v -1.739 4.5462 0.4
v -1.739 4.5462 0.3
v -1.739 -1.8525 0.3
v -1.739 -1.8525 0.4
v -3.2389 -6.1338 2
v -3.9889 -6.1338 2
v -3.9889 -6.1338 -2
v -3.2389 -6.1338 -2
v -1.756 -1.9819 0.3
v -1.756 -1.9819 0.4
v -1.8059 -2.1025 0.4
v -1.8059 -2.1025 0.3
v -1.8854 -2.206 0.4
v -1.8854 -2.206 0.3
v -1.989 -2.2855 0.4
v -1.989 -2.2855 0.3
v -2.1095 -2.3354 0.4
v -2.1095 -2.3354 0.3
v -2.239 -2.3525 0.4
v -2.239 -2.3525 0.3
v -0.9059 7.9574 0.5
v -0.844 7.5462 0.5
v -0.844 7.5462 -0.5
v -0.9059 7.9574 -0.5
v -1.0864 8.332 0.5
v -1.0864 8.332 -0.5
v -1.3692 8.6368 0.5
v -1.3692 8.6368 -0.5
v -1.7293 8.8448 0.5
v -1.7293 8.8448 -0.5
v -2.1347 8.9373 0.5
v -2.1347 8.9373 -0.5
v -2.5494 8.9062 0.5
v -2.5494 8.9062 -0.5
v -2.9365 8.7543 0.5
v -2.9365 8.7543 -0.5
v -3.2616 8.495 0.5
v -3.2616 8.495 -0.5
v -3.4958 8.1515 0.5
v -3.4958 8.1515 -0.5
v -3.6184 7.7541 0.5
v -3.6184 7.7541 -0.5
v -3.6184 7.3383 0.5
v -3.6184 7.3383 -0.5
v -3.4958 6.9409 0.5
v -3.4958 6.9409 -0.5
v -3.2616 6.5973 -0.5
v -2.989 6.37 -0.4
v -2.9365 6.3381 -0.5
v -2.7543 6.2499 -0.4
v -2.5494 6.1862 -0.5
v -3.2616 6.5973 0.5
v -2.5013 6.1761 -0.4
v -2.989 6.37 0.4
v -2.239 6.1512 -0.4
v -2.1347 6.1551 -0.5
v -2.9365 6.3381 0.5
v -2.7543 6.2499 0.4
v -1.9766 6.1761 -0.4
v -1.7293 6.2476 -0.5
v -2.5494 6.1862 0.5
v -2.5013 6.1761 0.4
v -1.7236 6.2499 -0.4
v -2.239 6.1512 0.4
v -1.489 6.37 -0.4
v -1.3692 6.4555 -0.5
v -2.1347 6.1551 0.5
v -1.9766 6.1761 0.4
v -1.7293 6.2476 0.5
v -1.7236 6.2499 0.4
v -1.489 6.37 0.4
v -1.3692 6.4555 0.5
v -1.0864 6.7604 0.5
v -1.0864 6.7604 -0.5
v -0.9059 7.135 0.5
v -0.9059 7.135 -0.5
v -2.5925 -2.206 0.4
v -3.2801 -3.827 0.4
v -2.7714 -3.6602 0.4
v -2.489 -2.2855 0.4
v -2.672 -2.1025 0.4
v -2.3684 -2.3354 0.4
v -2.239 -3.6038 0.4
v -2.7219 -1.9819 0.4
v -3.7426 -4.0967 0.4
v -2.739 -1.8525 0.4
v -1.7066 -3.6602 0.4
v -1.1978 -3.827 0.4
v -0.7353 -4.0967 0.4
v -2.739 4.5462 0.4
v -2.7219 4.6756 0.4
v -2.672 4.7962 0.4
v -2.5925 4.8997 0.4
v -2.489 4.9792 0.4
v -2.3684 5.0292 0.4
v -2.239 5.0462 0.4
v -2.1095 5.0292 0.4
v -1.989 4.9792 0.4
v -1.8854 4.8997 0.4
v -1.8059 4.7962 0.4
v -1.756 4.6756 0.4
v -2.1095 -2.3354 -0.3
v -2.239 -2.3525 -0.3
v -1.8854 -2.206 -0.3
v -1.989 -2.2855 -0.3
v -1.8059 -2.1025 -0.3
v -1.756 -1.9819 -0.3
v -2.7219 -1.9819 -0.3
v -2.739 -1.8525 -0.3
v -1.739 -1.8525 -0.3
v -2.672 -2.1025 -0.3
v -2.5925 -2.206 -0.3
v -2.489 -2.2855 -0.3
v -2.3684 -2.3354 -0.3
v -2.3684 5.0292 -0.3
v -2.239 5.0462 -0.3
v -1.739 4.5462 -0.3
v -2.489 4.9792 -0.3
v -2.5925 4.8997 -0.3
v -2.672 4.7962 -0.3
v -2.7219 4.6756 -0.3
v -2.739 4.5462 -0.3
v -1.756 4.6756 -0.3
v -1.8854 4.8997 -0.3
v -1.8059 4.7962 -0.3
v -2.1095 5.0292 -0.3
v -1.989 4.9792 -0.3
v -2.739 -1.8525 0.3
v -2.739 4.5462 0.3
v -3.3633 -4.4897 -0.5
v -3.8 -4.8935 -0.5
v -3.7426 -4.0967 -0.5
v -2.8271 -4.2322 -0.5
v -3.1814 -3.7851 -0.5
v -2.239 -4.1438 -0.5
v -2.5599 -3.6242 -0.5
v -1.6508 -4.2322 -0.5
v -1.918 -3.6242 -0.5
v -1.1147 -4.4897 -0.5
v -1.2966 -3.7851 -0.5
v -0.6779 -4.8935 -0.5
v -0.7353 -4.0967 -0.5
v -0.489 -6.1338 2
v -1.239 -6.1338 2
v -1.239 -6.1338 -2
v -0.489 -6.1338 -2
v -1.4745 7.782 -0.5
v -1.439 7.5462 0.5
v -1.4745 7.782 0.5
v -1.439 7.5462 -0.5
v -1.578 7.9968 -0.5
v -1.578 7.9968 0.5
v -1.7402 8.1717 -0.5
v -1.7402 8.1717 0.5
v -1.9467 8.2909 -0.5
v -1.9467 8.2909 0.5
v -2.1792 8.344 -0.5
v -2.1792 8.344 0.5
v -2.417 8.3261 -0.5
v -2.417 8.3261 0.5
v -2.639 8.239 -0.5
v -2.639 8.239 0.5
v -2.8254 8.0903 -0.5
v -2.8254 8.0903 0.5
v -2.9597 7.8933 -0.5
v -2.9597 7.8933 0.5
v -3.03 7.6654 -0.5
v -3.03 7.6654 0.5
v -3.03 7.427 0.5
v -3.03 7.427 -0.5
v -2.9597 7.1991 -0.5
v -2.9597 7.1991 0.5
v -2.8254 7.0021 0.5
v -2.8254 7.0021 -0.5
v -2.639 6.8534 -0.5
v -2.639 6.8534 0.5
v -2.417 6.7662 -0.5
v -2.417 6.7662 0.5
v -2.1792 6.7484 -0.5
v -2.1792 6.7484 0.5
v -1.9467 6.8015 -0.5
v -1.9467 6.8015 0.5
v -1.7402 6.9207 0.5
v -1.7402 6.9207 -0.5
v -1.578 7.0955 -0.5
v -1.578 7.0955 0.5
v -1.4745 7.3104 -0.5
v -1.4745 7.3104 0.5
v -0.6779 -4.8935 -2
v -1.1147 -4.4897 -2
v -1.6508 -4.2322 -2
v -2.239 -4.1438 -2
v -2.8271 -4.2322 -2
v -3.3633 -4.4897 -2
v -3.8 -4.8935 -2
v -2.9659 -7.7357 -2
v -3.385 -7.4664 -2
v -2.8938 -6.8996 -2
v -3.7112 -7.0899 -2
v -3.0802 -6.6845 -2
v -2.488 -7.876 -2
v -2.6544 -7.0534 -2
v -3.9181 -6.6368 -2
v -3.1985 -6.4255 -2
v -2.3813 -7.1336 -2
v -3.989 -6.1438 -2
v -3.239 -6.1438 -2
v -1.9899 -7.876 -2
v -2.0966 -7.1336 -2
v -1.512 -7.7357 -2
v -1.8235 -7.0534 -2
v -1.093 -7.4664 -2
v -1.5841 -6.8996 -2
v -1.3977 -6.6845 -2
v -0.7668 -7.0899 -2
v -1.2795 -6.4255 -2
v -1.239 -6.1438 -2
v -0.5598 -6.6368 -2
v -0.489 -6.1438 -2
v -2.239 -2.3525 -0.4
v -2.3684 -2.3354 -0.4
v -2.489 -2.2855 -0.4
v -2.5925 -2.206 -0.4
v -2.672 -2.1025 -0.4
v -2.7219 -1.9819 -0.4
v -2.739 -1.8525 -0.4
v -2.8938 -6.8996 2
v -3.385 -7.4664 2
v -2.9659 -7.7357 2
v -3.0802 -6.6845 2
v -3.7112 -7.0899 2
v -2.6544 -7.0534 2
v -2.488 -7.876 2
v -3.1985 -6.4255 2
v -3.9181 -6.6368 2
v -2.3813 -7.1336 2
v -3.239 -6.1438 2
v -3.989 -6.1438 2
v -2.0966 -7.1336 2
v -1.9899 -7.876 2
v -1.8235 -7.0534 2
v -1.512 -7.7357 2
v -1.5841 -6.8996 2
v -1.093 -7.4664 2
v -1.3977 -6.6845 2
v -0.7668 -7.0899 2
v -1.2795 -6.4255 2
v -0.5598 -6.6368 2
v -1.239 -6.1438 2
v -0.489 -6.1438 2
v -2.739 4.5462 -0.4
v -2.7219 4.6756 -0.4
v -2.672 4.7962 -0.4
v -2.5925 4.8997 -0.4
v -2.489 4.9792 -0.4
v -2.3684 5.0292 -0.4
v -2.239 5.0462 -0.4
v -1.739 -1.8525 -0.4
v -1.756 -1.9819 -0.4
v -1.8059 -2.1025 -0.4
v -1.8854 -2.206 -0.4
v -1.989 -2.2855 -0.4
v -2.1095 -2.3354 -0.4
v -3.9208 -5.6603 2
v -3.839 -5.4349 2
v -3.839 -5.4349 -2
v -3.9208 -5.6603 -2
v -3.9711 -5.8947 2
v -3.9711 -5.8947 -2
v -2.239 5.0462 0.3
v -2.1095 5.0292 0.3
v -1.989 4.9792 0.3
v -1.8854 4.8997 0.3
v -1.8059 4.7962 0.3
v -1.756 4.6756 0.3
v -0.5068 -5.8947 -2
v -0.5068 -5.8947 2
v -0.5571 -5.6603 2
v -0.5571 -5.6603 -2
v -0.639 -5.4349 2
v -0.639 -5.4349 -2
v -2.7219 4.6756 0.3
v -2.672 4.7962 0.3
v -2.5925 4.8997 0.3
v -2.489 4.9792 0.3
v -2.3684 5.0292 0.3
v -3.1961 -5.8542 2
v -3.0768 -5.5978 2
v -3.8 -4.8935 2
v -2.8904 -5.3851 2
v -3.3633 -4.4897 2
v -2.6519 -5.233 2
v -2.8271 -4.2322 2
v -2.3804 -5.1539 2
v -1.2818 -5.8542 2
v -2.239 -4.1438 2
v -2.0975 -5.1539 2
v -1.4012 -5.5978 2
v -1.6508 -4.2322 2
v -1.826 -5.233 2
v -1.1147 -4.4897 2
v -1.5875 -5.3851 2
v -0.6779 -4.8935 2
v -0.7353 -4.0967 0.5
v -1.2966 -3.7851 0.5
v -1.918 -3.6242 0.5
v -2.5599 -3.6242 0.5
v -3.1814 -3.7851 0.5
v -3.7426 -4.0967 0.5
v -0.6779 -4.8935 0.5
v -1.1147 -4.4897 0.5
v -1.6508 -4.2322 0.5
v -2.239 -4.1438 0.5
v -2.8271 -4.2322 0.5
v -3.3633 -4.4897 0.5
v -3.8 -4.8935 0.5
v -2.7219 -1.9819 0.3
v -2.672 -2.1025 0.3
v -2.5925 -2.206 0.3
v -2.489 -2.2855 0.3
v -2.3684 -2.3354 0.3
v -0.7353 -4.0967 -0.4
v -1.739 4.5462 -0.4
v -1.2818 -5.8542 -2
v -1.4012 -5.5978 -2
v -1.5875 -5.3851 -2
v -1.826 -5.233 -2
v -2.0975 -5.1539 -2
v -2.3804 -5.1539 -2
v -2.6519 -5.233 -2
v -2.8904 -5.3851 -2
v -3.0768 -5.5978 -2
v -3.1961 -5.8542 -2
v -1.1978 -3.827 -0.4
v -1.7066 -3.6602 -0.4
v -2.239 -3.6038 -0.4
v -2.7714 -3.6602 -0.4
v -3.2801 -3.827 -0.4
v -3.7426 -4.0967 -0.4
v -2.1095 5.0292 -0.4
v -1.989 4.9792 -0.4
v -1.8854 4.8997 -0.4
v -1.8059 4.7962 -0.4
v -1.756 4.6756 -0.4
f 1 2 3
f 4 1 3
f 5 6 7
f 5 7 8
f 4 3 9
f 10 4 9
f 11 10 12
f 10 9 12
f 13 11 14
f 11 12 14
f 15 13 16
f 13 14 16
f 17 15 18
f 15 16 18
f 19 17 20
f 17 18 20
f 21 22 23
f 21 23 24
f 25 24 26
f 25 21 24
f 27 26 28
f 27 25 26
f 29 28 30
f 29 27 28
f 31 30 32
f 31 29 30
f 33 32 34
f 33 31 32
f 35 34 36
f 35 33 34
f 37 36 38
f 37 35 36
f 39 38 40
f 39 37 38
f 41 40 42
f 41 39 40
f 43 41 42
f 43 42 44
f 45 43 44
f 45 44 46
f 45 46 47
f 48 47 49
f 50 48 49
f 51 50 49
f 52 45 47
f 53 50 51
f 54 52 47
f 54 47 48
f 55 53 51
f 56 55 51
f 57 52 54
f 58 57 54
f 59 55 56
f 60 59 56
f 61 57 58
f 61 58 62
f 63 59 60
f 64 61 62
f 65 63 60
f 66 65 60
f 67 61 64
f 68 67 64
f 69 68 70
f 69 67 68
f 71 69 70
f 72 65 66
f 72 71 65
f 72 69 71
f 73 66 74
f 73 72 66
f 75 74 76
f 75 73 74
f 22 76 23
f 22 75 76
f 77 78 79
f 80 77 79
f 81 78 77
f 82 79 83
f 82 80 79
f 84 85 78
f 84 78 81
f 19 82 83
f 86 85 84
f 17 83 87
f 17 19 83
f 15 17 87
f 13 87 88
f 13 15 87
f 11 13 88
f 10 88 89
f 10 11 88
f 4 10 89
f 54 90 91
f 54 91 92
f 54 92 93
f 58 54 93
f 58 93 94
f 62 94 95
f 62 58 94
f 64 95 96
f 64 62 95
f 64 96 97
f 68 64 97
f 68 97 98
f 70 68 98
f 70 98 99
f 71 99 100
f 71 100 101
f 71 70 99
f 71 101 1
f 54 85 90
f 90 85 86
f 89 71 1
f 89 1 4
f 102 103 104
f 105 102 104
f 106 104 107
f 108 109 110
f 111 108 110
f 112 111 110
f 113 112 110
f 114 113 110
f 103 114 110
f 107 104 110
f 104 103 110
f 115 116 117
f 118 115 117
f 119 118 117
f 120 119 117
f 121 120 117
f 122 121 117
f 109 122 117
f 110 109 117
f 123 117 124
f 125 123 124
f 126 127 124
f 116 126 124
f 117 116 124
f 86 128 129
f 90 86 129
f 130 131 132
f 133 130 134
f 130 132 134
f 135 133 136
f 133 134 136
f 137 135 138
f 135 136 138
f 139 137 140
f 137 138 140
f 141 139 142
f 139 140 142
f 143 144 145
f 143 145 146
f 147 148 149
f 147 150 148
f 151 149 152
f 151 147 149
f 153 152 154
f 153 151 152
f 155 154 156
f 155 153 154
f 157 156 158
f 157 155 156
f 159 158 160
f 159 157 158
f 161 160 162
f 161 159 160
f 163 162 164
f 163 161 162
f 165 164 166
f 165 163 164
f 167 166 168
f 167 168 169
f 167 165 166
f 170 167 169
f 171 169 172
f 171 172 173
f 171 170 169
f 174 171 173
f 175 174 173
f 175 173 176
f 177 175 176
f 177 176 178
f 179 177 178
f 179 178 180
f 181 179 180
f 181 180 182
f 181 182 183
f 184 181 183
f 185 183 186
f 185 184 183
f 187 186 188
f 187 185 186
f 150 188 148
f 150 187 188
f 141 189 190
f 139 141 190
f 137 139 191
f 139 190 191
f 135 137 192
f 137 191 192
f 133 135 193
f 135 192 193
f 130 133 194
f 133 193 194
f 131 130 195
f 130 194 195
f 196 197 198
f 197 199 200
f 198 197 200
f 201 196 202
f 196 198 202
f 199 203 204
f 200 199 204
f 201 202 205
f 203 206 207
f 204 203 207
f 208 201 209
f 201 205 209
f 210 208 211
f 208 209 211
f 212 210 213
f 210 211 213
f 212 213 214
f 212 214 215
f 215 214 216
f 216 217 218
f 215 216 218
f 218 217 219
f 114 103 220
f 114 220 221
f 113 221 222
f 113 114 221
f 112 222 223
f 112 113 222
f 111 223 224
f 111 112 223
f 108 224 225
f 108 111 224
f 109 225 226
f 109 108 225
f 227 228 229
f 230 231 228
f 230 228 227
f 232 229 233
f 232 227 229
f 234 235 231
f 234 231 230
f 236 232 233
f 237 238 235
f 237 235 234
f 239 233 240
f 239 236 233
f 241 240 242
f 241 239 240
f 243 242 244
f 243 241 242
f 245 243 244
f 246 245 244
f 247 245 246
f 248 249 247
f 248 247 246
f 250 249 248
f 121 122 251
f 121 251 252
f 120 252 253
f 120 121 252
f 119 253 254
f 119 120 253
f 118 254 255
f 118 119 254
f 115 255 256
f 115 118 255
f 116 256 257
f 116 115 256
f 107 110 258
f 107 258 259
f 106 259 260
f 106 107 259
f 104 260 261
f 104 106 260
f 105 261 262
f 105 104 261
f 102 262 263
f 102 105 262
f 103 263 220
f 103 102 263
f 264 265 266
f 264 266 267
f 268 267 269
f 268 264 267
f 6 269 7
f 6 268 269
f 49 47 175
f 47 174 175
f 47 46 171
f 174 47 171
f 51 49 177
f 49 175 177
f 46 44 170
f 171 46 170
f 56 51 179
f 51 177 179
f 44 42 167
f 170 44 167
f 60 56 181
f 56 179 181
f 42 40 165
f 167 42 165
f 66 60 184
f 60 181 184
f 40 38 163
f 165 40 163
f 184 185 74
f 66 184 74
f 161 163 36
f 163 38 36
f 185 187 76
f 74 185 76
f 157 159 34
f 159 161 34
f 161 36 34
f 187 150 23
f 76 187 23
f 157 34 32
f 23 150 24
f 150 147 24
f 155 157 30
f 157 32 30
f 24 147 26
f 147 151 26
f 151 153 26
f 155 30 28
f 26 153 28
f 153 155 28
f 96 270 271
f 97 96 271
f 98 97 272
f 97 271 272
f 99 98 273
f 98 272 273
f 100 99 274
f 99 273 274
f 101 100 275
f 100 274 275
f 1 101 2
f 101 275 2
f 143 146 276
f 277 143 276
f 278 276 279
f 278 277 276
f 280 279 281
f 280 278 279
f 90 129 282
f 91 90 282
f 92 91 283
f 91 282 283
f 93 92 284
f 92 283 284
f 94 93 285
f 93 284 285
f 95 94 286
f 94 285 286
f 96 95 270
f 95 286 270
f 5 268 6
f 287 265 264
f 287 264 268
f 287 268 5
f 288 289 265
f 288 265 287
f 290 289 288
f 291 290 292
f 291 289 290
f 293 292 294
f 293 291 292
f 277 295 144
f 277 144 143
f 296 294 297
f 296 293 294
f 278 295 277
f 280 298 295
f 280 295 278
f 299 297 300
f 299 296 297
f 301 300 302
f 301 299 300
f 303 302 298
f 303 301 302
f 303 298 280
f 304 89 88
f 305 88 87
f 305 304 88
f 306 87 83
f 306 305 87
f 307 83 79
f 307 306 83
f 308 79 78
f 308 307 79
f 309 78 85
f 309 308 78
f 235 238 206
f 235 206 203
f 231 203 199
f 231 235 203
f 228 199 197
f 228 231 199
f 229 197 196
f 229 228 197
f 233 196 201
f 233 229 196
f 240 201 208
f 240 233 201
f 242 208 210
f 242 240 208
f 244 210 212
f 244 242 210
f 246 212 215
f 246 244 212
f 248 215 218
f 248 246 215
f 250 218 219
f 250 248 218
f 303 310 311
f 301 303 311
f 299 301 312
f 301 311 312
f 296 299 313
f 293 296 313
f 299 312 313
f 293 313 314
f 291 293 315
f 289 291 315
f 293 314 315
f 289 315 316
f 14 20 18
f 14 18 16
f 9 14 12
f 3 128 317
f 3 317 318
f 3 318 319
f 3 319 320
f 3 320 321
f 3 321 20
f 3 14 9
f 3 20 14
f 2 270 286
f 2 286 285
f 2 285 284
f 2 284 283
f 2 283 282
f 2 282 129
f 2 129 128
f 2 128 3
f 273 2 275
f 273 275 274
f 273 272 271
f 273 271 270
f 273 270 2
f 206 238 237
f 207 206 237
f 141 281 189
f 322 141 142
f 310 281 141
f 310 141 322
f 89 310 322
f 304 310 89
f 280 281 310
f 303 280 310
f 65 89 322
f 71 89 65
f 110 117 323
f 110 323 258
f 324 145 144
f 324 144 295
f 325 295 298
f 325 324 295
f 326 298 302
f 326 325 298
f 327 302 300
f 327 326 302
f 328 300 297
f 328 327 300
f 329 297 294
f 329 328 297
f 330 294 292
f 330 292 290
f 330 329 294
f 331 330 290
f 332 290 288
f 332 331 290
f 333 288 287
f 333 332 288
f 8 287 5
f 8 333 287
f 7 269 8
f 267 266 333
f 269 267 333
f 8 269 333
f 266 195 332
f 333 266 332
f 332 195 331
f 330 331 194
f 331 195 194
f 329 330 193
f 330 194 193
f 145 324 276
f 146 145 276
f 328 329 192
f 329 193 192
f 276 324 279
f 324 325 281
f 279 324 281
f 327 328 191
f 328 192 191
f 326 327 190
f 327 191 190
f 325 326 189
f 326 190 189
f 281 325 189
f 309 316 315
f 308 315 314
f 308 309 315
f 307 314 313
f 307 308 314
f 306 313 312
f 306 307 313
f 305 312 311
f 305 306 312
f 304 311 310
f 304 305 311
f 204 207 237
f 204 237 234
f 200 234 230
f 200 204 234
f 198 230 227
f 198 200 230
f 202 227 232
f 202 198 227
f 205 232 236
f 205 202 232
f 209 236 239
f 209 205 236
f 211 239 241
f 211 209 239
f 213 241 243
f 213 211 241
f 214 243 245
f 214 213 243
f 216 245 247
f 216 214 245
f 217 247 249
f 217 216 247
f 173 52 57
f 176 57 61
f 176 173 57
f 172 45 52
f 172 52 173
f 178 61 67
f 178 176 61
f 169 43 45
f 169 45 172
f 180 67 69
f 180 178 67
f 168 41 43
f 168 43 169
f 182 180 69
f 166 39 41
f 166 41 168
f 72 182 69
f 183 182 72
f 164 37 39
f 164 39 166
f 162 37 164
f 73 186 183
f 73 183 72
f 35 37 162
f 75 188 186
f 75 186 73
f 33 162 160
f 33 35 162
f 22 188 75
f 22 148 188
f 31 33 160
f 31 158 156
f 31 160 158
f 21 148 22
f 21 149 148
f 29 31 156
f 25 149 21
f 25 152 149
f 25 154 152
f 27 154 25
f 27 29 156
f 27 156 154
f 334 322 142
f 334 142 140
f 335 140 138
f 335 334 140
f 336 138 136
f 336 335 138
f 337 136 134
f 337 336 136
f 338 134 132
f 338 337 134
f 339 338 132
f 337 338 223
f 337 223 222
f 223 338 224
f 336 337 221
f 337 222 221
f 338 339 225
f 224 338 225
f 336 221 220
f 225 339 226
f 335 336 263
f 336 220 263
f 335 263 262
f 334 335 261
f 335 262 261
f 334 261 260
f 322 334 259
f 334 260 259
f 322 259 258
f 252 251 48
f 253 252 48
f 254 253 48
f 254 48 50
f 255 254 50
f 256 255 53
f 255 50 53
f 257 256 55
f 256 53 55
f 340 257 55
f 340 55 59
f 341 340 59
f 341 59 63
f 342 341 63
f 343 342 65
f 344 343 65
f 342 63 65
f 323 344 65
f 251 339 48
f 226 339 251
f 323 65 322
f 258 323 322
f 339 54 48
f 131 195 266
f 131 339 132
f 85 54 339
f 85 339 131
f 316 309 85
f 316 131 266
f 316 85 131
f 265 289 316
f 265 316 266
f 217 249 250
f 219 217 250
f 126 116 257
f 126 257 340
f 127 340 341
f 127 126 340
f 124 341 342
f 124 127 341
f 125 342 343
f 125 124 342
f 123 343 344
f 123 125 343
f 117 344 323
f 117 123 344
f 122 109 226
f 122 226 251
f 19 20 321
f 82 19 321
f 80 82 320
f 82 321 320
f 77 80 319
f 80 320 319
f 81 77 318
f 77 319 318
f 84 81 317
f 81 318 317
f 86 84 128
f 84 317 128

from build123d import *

# Parameters (mm, degrees)
SKETCH2_R                = 1.395
SKETCH2_R_2              = 0.8
BOSS_EXTRUDE1_DEPTH      = 0.5
SKETCH2_R_3              = 2.54
SKETCH2_R_4              = 1
BOSS_EXTRUDE1_2_DEPTH    = 0.5
BOSS_EXTRUDE2_DEPTH      = 0.4
BOSS_EXTRUDE3_DEPTH      = 0.3
BOSS_EXTRUDE4_DEPTH      = 1.5
BOSS_EXTRUDE4_DEPTH_BACK = 2.5
SKETCH3_R                = 2
SKETCH3_R_2              = 1
CUT_EXTRUDE1_DEPTH       = 15.75
SKETCH5_W                = 4.687829616
SKETCH5_H                = 0.01
CUT_EXTRUDE2_DEPTH       = 15.75


with BuildPart() as part:
    # Sketch2 → Boss-Extrude1 (new, symmetric)
    with BuildSketch(Plane.XY):
        with Locations((-2.238959124, 7.546189547)):
            Circle(SKETCH2_R)
        with Locations((-2.238959124, 7.546189547)):
            Circle(SKETCH2_R_2, mode=Mode.SUBTRACT)
    extrude(amount=BOSS_EXTRUDE1_DEPTH, both=True)



with BuildPart() as body_2:
    # Sketch2 → Boss-Extrude1 2 (new, symmetric)
    with BuildSketch(Plane.XY):
        with Locations((-2.238959124, -6.143810453)):
            Circle(SKETCH2_R_3)
        with Locations((-2.238959124, -6.143810453)):
            Circle(SKETCH2_R_4, mode=Mode.SUBTRACT)
    extrude(amount=BOSS_EXTRUDE1_2_DEPTH, both=True)


with BuildPart() as part_1:
    add(part.part)

    add(body_2.part)  # Boss-Extrude2 merges body 2
    # Sketch2<4> → Boss-Extrude2 (add, symmetric)
    with BuildSketch(Plane.XY):
        with BuildLine():
            Line((-2.988959124, 6.369956152), (-3.888959124, -4.212722677))
            ThreePointArc((-3.888959124, -4.212722677), (-2.238959124, -3.603810453), (-0.588959124, -4.212722677))
            Line((-0.588959124, -4.212722677), (-1.488959124, 6.369956152))
            ThreePointArc((-1.488959124, 6.369956152), (-2.238959124, 6.151189547), (-2.988959124, 6.369956152))
        make_face()
        with BuildLine():
            ThreePointArc((-2.738959124, 4.546189547), (-2.238959124, 5.046189547), (-1.738959124, 4.546189547))
            Line((-1.738959124, 4.546189547), (-1.738959124, -1.852472132))
            ThreePointArc((-1.738959124, -1.852472132), (-2.238959124, -2.352472132), (-2.738959124, -1.852472132))
            Line((-2.738959124, -1.852472132), (-2.738959124, 4.546189547))
        make_face(mode=Mode.SUBTRACT)
    extrude(amount=BOSS_EXTRUDE2_DEPTH, both=True)

    # Sketch2<5> → Boss-Extrude3 (add, symmetric)
    with BuildSketch(Plane.XY):
        with BuildLine():
            ThreePointArc((-1.738959124, 4.546189547), (-2.238959124, 5.046189547), (-2.738959124, 4.546189547))
            Line((-2.738959124, 4.546189547), (-2.738959124, -1.852472132))
            ThreePointArc((-2.738959124, -1.852472132), (-2.238959124, -2.352472132), (-1.738959124, -1.852472132))
            Line((-1.738959124, -1.852472132), (-1.738959124, 4.546189547))
        make_face()
    extrude(amount=BOSS_EXTRUDE3_DEPTH, both=True)

    # Sketch3 → Boss-Extrude4 (add, two sides: drawn at the far end of the back side and taken through both)
    with BuildSketch(Plane.XY.offset(0.5).offset(-BOSS_EXTRUDE4_DEPTH_BACK)):
        with Locations((-2.238959124, -6.143810453)):
            Circle(SKETCH3_R)
        with Locations((-2.238959124, -6.143810453)):
            Circle(SKETCH3_R_2, mode=Mode.SUBTRACT)
    extrude(amount=BOSS_EXTRUDE4_DEPTH + BOSS_EXTRUDE4_DEPTH_BACK)

    # Sketch4 → Cut-Extrude1 (cut, symmetric)
    with BuildSketch(Plane.XY.offset(2)):
        with BuildLine():
            Line((-5.204168886, -4.2843667), (-2.988959124, 6.369956152))
            Line((-2.988959124, 6.369956152), (-3.838959124, -5.434938109))
            ThreePointArc((-3.838959124, -5.434938109), (-2.238959124, -7.893810453), (-0.638959124, -5.434938109))
            Line((-0.638959124, -5.434938109), (-1.488959124, 6.369956152))
            Line((-1.488959124, 6.369956152), (0.726250638, -4.2843667))
            ThreePointArc((0.726250638, -4.2843667), (-2.238959124, -9.643810453), (-5.204168886, -4.2843667))
        make_face()
    extrude(amount=CUT_EXTRUDE1_DEPTH, both=True, mode=Mode.SUBTRACT)

    # Sketch5 → Cut-Extrude2 (cut, symmetric)
    with BuildSketch(Plane.XY.offset(2)):
        with Locations((-2.712865397, -6.138810453)):
            Rectangle(SKETCH5_W, SKETCH5_H)
    extrude(amount=CUT_EXTRUDE2_DEPTH, both=True, mode=Mode.SUBTRACT)


with BuildPart() as cut_extrude2_piece_1:
    # of the separate pieces the step leaves, piece 1, a body of its own (cut_extrude2_pieces)
    add(part_1.part.solids().sort_by_distance((-0.735317687, -4.096699702, -0.5))[0])


with BuildPart() as cut_extrude2_piece_2:
    # of the separate pieces the step leaves, piece 2, a body of its own (cut_extrude2_pieces)
    add(part_1.part.solids().sort_by_distance((-3.988959124, -6.143810453, 2))[0])


solid = Compound([cut_extrude2_piece_1.part, cut_extrude2_piece_2.part])
